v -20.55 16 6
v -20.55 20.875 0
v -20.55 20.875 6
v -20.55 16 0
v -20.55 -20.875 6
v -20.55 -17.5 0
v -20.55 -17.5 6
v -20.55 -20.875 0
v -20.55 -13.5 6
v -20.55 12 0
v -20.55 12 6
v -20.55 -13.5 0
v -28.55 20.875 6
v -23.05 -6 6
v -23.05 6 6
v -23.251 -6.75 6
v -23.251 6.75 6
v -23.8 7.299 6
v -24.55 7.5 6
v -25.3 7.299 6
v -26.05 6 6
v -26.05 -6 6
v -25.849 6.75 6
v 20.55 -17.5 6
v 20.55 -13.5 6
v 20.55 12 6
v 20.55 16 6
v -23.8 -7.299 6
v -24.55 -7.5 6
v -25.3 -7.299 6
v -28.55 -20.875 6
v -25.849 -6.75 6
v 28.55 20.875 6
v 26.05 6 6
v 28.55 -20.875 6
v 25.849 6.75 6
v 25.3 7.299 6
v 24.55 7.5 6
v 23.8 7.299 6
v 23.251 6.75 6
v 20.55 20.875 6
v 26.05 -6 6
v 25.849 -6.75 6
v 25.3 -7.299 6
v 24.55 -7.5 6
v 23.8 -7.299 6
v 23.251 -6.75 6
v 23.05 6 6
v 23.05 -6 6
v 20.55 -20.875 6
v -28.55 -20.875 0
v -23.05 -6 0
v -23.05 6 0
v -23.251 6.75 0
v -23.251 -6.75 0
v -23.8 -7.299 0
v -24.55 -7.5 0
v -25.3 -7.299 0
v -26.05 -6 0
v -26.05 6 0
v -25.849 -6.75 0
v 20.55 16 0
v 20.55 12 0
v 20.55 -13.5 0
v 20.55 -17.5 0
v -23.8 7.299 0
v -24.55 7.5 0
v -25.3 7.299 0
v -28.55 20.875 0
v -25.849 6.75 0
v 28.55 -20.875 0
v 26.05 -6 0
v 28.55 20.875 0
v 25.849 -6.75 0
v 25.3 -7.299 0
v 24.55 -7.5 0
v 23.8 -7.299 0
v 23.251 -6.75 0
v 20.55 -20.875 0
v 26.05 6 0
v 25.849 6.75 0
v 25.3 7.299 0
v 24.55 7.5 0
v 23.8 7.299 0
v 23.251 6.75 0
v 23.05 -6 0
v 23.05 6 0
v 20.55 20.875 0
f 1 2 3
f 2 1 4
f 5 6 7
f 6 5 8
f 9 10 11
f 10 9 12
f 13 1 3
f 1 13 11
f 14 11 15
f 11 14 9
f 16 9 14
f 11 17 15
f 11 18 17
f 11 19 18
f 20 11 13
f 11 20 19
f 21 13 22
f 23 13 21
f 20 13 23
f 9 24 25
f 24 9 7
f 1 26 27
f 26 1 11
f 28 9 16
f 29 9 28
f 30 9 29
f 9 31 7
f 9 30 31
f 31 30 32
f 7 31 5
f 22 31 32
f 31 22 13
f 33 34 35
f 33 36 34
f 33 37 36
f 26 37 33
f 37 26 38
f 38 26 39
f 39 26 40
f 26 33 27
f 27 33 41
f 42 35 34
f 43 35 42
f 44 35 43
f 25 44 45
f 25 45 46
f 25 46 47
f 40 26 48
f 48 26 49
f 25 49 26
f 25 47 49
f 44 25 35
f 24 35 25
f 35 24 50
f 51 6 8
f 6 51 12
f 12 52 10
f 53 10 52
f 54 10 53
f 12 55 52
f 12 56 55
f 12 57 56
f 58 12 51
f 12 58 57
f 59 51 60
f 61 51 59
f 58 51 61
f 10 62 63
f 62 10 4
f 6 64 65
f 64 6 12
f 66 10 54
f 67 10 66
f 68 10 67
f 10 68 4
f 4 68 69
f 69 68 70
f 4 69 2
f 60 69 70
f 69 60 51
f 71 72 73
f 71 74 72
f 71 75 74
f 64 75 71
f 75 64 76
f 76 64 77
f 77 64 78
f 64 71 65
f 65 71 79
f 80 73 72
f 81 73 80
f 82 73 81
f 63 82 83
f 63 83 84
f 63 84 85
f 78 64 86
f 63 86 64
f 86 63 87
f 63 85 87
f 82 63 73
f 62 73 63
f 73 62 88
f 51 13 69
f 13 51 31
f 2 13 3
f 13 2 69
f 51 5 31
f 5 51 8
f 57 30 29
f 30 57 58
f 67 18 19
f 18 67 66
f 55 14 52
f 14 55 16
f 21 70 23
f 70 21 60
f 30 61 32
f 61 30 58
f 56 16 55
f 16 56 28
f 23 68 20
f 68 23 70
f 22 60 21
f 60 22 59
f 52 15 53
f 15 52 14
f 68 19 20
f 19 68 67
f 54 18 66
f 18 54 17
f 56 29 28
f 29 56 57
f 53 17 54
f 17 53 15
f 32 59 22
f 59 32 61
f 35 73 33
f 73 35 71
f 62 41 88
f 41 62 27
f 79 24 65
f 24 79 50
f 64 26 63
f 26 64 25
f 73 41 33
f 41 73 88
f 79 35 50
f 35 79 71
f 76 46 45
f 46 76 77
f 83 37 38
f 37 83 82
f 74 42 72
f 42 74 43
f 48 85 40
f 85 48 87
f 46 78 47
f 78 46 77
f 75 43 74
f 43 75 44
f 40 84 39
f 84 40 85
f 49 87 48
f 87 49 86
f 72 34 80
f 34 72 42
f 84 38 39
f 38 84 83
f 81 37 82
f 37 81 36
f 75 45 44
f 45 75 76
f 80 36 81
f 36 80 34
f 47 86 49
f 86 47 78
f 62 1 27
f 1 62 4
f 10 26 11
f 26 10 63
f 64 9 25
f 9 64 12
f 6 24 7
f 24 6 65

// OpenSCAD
// file: waterblock.scad
// TODO: height needs to be measured
// TODO: barb dimensions!

module waterblock() {
  color("blue")
  union () {
    cube(size=[41.1, 41.75, 12.25], center=true);
    
    for (x=[-1,1]) {
      translate([x * (41.5 - 11.5) / 2, -25, 0])
        rotate([90, 0, 0])
          cylinder(r=11.5/2, h=12, center=true);
    }
  }
}
// main file
use <waterblock.scad>

wb_w = 41.1;
wb_d = 41.75;
wb_h = 12.25;
wb_inlet_d = (41.5 - 11.5);
wb_inlet_r = 11.5/2;

margin = 8;

tec_h = 3.3;
tec_w = 40;
tec_d = 40;

t = 6;

mounting_screw_d = 3;
mounting_screw_head_d = 5; // TODO: measure
mounting_screw_head_t = 3; // TODO: measure

components_depth = wb_h + tec_h + 2;
carriage_depth = 3 + components_depth;

clamp_drill_d = .0890 * 25.4;

// TODO: rounded corners on main shape
module base() {
  translate([0, 0, carriage_depth/2])
  difference() {
    cube(size=[wb_w + 2 * margin, wb_d + 2 * margin, carriage_depth], center=true);

    translate([0, 0, carriage_depth/2 - components_depth/2]) {
      cube(size=[wb_w + 0.1, wb_d + 0.1, components_depth+0.1], center=true);
      for (x=[-1,1]) {
        translate([x * wb_inlet_d / 2, -(wb_d + 2 * margin) / 2, 0])
          cube(size=[wb_inlet_r * 2 + 0.1, margin*2, components_depth+0.1], center=true);
      }
    }

    for (x=[-1,1], y=[-1,1]) {
      translate([x * (wb_w / 2 + margin / 2), y * (wb_d / 2 + margin / 2), 0]) {
        cylinder(r=mounting_screw_d/2, h=2*carriage_depth, center=true, $fn=12);

        translate([0, 0, carriage_depth/2 - mounting_screw_head_t/2])
          cylinder(r=mounting_screw_head_d/2, h=mounting_screw_head_t+0.1, center=true, $fn=16);
      }
    }

    for (x=[-1,1], y=[-1,1]) {
      translate([x * (wb_w + margin) / 2, y * 4, carriage_depth/2]) 
        cylinder(r=clamp_drill_d/2, h=10, center=true, $fn=36);
    }
  }
}

module clamp() {
  color("pink") 
  translate([0, 0, 6/2]) {
    translate([0, 14, 0]) 
      cube(size=[wb_w + margin*2, 4, 6], center=true);
    translate([0, -15.5, 0]) 
      cube(size=[wb_w + margin*2, 4, 6], center=true);

    for (x=[-1,1]) {
      translate([x * (wb_w + margin) / 2, 0, 0]) {
        difference() {
          cube(size=[margin, wb_d, 6], center=true);
          hull() {
            for (y=[-1,1]) {
              translate([0, y * 6, 0])
                cylinder(r=1.5, h=10, center=true, $fn=12);
            }
          }
        }
      }
    }
  }
}

module tec() {
  color("white")
    cube(size=[40, 40, tec_h], center=true);
}

module heatsink() {
  color("gray") {
    translate([0, 0, 2.5/2])
      cube(size=[40, 40, 2.5], center=true);

    translate([40/2 - 3/2, 0, 30/2]) cube(size=[3, 40, 30], center=true);

    for (x=[0:4]) {
      translate([-40/2 + 1.8/2 + x * (5.5 + 1.8), 0, 30/2]) cube(size=[1.8, 40, 30], center=true);
    }
  }
}

base();

translate([0, 0, carriage_depth]) 
  !clamp();


translate([0, 0, t/2 + wb_h/2])
  waterblock();

translate([0, 0, t/2 + wb_h + tec_h/2])
  tec();

translate([0, 0, t/2 + wb_h + tec_h])
  rotate([0, 0, 90]) heatsink();
